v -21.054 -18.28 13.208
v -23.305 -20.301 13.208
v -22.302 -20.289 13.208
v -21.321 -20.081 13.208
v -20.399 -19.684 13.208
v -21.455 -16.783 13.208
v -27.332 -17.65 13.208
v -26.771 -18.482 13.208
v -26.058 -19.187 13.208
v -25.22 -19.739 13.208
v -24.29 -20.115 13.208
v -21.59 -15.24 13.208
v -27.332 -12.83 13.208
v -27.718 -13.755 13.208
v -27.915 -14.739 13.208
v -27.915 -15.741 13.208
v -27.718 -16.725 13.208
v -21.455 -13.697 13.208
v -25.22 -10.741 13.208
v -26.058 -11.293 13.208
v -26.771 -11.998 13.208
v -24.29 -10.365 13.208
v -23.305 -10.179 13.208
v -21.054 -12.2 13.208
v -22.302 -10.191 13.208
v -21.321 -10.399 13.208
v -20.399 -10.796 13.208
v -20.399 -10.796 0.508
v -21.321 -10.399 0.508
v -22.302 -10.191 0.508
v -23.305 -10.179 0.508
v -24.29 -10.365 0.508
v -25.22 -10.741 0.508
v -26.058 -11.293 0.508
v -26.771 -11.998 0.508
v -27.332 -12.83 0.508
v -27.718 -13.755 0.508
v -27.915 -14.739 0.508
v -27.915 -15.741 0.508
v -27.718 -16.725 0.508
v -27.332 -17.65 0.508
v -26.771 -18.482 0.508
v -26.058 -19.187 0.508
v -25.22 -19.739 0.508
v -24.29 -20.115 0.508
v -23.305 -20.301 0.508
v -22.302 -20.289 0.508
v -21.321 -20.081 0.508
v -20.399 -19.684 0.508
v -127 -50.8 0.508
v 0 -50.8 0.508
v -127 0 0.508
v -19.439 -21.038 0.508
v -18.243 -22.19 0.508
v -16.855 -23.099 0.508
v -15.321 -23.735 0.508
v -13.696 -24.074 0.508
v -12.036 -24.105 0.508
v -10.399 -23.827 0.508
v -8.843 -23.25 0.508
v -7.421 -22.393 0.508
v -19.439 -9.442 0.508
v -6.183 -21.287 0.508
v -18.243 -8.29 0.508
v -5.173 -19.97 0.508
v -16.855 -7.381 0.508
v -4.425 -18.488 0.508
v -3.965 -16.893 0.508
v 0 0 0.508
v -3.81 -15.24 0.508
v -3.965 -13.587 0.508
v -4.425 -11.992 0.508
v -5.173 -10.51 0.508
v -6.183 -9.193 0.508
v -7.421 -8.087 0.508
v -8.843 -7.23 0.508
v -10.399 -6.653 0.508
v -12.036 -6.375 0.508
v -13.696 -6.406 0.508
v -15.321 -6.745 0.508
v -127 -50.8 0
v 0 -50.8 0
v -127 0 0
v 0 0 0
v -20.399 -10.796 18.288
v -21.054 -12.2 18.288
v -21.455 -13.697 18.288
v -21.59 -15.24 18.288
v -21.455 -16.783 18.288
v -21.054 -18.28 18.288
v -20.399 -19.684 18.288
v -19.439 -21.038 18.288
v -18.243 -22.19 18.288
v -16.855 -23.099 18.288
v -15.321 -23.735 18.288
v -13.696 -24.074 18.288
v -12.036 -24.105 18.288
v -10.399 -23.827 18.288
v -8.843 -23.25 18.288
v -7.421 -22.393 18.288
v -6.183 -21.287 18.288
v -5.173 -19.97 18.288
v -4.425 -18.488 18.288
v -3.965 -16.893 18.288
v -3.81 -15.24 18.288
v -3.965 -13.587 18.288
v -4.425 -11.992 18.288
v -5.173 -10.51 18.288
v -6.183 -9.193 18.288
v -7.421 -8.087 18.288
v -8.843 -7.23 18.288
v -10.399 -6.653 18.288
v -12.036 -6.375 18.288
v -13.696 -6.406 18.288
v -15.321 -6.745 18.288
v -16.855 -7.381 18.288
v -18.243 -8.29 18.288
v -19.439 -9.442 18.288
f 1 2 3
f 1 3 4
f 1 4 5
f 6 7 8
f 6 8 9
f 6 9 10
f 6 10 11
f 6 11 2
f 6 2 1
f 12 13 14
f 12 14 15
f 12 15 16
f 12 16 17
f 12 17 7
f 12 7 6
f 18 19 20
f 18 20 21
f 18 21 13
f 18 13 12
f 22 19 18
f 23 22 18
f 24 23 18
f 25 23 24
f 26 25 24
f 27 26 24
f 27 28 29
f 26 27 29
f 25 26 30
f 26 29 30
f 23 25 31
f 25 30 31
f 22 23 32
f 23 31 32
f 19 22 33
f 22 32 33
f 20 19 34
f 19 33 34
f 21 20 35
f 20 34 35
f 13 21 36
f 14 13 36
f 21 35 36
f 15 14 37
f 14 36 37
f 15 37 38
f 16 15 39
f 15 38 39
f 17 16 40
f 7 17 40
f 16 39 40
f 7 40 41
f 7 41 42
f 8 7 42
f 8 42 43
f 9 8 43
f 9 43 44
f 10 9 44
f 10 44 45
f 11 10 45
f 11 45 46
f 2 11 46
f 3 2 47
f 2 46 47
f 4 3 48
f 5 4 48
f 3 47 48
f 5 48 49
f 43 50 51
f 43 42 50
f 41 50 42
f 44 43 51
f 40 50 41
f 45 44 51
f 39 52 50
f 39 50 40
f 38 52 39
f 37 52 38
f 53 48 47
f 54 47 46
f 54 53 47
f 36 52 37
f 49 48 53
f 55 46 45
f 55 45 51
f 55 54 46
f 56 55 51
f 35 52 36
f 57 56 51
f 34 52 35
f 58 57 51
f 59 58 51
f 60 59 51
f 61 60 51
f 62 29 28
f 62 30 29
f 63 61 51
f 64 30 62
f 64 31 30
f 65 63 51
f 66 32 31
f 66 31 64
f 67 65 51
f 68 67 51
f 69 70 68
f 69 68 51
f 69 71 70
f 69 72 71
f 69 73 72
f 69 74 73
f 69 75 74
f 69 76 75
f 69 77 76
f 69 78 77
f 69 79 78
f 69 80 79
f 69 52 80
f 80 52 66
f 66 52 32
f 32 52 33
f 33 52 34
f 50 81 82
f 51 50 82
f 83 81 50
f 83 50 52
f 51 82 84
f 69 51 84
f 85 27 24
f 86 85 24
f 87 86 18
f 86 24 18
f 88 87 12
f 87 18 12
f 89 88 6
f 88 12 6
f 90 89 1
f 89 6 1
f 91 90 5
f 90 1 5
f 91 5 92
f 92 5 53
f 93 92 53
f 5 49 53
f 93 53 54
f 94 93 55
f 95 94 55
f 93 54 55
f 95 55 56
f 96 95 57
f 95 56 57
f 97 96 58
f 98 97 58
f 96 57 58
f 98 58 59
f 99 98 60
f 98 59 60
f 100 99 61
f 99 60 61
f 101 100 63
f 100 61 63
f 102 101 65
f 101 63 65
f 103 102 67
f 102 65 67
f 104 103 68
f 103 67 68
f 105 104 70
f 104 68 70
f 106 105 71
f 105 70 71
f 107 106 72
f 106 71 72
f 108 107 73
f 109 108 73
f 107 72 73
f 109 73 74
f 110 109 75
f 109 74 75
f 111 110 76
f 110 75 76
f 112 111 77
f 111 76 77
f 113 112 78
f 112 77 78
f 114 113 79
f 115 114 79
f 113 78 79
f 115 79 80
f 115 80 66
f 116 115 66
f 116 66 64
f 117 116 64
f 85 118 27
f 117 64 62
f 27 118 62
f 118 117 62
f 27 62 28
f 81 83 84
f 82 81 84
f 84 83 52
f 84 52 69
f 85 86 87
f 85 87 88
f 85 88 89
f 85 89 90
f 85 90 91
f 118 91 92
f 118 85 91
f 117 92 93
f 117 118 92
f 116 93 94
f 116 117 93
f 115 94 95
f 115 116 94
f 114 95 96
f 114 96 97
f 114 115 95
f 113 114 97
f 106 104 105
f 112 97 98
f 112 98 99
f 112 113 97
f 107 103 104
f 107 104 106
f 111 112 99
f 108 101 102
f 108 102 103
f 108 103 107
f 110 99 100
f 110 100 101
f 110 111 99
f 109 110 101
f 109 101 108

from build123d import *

# Parameters (mm, degrees)
F0_W     = 127
F0_H     = 50.8
F1_DEPTH = 0.508
F3_DEPTH = 12.7
F5_DEPTH = 5.08


with BuildPart() as f1:
    # F0 (on Top) → F1 (new body)
    with BuildSketch(Plane.XY):
        with Locations((-63.5, -25.4)):
            Rectangle(F0_W, F0_H)
    extrude(amount=F1_DEPTH)

    # F2 (on face) → F3 (join)
    with BuildSketch(Plane.XY.offset(0.508)):
        with BuildLine():
            ThreePointArc((-20.399375, -19.6842912381), (-10.3994939415, -23.8271864935), (-3.81, -15.24))
            ThreePointArc((-3.81, -15.24), (-10.3994939415, -6.6528135065), (-20.399375, -10.7957087619))
            ThreePointArc((-20.399375, -10.7957087619), (-18.4835645212, -12.6606178065), (-17.78, -15.24))
            ThreePointArc((-17.78, -15.24), (-18.4835645212, -17.8193821935), (-20.399375, -19.6842912381))
        make_face()
        with BuildLine():
            ThreePointArc((-17.78, -15.24), (-18.4835645212, -12.6606178065), (-20.399375, -10.7957087619))
            ThreePointArc((-20.399375, -10.7957087619), (-21.59, -15.24), (-20.399375, -19.6842912381))
            ThreePointArc((-20.399375, -19.6842912381), (-18.4835645212, -17.8193821935), (-17.78, -15.24))
        make_face()
        with BuildLine():
            ThreePointArc((-20.399375, -19.6842912381), (-21.59, -15.24), (-20.399375, -10.7957087619))
            ThreePointArc((-20.399375, -10.7957087619), (-27.94, -15.24), (-20.399375, -19.6842912381))
        make_face()
    extrude(amount=F3_DEPTH)

    # F4 (on face) → F5 (join)
    with BuildSketch(Plane.XY.offset(13.208)):
        with BuildLine():
            ThreePointArc((-20.399375, -19.6842912381), (-10.3994939415, -23.8271864935), (-3.81, -15.24))
            ThreePointArc((-3.81, -15.24), (-10.3994939415, -6.6528135065), (-20.399375, -10.7957087619))
            ThreePointArc((-20.399375, -10.7957087619), (-21.59, -15.24), (-20.399375, -19.6842912381))
        make_face()
    extrude(amount=F5_DEPTH)


solid = f1.part
